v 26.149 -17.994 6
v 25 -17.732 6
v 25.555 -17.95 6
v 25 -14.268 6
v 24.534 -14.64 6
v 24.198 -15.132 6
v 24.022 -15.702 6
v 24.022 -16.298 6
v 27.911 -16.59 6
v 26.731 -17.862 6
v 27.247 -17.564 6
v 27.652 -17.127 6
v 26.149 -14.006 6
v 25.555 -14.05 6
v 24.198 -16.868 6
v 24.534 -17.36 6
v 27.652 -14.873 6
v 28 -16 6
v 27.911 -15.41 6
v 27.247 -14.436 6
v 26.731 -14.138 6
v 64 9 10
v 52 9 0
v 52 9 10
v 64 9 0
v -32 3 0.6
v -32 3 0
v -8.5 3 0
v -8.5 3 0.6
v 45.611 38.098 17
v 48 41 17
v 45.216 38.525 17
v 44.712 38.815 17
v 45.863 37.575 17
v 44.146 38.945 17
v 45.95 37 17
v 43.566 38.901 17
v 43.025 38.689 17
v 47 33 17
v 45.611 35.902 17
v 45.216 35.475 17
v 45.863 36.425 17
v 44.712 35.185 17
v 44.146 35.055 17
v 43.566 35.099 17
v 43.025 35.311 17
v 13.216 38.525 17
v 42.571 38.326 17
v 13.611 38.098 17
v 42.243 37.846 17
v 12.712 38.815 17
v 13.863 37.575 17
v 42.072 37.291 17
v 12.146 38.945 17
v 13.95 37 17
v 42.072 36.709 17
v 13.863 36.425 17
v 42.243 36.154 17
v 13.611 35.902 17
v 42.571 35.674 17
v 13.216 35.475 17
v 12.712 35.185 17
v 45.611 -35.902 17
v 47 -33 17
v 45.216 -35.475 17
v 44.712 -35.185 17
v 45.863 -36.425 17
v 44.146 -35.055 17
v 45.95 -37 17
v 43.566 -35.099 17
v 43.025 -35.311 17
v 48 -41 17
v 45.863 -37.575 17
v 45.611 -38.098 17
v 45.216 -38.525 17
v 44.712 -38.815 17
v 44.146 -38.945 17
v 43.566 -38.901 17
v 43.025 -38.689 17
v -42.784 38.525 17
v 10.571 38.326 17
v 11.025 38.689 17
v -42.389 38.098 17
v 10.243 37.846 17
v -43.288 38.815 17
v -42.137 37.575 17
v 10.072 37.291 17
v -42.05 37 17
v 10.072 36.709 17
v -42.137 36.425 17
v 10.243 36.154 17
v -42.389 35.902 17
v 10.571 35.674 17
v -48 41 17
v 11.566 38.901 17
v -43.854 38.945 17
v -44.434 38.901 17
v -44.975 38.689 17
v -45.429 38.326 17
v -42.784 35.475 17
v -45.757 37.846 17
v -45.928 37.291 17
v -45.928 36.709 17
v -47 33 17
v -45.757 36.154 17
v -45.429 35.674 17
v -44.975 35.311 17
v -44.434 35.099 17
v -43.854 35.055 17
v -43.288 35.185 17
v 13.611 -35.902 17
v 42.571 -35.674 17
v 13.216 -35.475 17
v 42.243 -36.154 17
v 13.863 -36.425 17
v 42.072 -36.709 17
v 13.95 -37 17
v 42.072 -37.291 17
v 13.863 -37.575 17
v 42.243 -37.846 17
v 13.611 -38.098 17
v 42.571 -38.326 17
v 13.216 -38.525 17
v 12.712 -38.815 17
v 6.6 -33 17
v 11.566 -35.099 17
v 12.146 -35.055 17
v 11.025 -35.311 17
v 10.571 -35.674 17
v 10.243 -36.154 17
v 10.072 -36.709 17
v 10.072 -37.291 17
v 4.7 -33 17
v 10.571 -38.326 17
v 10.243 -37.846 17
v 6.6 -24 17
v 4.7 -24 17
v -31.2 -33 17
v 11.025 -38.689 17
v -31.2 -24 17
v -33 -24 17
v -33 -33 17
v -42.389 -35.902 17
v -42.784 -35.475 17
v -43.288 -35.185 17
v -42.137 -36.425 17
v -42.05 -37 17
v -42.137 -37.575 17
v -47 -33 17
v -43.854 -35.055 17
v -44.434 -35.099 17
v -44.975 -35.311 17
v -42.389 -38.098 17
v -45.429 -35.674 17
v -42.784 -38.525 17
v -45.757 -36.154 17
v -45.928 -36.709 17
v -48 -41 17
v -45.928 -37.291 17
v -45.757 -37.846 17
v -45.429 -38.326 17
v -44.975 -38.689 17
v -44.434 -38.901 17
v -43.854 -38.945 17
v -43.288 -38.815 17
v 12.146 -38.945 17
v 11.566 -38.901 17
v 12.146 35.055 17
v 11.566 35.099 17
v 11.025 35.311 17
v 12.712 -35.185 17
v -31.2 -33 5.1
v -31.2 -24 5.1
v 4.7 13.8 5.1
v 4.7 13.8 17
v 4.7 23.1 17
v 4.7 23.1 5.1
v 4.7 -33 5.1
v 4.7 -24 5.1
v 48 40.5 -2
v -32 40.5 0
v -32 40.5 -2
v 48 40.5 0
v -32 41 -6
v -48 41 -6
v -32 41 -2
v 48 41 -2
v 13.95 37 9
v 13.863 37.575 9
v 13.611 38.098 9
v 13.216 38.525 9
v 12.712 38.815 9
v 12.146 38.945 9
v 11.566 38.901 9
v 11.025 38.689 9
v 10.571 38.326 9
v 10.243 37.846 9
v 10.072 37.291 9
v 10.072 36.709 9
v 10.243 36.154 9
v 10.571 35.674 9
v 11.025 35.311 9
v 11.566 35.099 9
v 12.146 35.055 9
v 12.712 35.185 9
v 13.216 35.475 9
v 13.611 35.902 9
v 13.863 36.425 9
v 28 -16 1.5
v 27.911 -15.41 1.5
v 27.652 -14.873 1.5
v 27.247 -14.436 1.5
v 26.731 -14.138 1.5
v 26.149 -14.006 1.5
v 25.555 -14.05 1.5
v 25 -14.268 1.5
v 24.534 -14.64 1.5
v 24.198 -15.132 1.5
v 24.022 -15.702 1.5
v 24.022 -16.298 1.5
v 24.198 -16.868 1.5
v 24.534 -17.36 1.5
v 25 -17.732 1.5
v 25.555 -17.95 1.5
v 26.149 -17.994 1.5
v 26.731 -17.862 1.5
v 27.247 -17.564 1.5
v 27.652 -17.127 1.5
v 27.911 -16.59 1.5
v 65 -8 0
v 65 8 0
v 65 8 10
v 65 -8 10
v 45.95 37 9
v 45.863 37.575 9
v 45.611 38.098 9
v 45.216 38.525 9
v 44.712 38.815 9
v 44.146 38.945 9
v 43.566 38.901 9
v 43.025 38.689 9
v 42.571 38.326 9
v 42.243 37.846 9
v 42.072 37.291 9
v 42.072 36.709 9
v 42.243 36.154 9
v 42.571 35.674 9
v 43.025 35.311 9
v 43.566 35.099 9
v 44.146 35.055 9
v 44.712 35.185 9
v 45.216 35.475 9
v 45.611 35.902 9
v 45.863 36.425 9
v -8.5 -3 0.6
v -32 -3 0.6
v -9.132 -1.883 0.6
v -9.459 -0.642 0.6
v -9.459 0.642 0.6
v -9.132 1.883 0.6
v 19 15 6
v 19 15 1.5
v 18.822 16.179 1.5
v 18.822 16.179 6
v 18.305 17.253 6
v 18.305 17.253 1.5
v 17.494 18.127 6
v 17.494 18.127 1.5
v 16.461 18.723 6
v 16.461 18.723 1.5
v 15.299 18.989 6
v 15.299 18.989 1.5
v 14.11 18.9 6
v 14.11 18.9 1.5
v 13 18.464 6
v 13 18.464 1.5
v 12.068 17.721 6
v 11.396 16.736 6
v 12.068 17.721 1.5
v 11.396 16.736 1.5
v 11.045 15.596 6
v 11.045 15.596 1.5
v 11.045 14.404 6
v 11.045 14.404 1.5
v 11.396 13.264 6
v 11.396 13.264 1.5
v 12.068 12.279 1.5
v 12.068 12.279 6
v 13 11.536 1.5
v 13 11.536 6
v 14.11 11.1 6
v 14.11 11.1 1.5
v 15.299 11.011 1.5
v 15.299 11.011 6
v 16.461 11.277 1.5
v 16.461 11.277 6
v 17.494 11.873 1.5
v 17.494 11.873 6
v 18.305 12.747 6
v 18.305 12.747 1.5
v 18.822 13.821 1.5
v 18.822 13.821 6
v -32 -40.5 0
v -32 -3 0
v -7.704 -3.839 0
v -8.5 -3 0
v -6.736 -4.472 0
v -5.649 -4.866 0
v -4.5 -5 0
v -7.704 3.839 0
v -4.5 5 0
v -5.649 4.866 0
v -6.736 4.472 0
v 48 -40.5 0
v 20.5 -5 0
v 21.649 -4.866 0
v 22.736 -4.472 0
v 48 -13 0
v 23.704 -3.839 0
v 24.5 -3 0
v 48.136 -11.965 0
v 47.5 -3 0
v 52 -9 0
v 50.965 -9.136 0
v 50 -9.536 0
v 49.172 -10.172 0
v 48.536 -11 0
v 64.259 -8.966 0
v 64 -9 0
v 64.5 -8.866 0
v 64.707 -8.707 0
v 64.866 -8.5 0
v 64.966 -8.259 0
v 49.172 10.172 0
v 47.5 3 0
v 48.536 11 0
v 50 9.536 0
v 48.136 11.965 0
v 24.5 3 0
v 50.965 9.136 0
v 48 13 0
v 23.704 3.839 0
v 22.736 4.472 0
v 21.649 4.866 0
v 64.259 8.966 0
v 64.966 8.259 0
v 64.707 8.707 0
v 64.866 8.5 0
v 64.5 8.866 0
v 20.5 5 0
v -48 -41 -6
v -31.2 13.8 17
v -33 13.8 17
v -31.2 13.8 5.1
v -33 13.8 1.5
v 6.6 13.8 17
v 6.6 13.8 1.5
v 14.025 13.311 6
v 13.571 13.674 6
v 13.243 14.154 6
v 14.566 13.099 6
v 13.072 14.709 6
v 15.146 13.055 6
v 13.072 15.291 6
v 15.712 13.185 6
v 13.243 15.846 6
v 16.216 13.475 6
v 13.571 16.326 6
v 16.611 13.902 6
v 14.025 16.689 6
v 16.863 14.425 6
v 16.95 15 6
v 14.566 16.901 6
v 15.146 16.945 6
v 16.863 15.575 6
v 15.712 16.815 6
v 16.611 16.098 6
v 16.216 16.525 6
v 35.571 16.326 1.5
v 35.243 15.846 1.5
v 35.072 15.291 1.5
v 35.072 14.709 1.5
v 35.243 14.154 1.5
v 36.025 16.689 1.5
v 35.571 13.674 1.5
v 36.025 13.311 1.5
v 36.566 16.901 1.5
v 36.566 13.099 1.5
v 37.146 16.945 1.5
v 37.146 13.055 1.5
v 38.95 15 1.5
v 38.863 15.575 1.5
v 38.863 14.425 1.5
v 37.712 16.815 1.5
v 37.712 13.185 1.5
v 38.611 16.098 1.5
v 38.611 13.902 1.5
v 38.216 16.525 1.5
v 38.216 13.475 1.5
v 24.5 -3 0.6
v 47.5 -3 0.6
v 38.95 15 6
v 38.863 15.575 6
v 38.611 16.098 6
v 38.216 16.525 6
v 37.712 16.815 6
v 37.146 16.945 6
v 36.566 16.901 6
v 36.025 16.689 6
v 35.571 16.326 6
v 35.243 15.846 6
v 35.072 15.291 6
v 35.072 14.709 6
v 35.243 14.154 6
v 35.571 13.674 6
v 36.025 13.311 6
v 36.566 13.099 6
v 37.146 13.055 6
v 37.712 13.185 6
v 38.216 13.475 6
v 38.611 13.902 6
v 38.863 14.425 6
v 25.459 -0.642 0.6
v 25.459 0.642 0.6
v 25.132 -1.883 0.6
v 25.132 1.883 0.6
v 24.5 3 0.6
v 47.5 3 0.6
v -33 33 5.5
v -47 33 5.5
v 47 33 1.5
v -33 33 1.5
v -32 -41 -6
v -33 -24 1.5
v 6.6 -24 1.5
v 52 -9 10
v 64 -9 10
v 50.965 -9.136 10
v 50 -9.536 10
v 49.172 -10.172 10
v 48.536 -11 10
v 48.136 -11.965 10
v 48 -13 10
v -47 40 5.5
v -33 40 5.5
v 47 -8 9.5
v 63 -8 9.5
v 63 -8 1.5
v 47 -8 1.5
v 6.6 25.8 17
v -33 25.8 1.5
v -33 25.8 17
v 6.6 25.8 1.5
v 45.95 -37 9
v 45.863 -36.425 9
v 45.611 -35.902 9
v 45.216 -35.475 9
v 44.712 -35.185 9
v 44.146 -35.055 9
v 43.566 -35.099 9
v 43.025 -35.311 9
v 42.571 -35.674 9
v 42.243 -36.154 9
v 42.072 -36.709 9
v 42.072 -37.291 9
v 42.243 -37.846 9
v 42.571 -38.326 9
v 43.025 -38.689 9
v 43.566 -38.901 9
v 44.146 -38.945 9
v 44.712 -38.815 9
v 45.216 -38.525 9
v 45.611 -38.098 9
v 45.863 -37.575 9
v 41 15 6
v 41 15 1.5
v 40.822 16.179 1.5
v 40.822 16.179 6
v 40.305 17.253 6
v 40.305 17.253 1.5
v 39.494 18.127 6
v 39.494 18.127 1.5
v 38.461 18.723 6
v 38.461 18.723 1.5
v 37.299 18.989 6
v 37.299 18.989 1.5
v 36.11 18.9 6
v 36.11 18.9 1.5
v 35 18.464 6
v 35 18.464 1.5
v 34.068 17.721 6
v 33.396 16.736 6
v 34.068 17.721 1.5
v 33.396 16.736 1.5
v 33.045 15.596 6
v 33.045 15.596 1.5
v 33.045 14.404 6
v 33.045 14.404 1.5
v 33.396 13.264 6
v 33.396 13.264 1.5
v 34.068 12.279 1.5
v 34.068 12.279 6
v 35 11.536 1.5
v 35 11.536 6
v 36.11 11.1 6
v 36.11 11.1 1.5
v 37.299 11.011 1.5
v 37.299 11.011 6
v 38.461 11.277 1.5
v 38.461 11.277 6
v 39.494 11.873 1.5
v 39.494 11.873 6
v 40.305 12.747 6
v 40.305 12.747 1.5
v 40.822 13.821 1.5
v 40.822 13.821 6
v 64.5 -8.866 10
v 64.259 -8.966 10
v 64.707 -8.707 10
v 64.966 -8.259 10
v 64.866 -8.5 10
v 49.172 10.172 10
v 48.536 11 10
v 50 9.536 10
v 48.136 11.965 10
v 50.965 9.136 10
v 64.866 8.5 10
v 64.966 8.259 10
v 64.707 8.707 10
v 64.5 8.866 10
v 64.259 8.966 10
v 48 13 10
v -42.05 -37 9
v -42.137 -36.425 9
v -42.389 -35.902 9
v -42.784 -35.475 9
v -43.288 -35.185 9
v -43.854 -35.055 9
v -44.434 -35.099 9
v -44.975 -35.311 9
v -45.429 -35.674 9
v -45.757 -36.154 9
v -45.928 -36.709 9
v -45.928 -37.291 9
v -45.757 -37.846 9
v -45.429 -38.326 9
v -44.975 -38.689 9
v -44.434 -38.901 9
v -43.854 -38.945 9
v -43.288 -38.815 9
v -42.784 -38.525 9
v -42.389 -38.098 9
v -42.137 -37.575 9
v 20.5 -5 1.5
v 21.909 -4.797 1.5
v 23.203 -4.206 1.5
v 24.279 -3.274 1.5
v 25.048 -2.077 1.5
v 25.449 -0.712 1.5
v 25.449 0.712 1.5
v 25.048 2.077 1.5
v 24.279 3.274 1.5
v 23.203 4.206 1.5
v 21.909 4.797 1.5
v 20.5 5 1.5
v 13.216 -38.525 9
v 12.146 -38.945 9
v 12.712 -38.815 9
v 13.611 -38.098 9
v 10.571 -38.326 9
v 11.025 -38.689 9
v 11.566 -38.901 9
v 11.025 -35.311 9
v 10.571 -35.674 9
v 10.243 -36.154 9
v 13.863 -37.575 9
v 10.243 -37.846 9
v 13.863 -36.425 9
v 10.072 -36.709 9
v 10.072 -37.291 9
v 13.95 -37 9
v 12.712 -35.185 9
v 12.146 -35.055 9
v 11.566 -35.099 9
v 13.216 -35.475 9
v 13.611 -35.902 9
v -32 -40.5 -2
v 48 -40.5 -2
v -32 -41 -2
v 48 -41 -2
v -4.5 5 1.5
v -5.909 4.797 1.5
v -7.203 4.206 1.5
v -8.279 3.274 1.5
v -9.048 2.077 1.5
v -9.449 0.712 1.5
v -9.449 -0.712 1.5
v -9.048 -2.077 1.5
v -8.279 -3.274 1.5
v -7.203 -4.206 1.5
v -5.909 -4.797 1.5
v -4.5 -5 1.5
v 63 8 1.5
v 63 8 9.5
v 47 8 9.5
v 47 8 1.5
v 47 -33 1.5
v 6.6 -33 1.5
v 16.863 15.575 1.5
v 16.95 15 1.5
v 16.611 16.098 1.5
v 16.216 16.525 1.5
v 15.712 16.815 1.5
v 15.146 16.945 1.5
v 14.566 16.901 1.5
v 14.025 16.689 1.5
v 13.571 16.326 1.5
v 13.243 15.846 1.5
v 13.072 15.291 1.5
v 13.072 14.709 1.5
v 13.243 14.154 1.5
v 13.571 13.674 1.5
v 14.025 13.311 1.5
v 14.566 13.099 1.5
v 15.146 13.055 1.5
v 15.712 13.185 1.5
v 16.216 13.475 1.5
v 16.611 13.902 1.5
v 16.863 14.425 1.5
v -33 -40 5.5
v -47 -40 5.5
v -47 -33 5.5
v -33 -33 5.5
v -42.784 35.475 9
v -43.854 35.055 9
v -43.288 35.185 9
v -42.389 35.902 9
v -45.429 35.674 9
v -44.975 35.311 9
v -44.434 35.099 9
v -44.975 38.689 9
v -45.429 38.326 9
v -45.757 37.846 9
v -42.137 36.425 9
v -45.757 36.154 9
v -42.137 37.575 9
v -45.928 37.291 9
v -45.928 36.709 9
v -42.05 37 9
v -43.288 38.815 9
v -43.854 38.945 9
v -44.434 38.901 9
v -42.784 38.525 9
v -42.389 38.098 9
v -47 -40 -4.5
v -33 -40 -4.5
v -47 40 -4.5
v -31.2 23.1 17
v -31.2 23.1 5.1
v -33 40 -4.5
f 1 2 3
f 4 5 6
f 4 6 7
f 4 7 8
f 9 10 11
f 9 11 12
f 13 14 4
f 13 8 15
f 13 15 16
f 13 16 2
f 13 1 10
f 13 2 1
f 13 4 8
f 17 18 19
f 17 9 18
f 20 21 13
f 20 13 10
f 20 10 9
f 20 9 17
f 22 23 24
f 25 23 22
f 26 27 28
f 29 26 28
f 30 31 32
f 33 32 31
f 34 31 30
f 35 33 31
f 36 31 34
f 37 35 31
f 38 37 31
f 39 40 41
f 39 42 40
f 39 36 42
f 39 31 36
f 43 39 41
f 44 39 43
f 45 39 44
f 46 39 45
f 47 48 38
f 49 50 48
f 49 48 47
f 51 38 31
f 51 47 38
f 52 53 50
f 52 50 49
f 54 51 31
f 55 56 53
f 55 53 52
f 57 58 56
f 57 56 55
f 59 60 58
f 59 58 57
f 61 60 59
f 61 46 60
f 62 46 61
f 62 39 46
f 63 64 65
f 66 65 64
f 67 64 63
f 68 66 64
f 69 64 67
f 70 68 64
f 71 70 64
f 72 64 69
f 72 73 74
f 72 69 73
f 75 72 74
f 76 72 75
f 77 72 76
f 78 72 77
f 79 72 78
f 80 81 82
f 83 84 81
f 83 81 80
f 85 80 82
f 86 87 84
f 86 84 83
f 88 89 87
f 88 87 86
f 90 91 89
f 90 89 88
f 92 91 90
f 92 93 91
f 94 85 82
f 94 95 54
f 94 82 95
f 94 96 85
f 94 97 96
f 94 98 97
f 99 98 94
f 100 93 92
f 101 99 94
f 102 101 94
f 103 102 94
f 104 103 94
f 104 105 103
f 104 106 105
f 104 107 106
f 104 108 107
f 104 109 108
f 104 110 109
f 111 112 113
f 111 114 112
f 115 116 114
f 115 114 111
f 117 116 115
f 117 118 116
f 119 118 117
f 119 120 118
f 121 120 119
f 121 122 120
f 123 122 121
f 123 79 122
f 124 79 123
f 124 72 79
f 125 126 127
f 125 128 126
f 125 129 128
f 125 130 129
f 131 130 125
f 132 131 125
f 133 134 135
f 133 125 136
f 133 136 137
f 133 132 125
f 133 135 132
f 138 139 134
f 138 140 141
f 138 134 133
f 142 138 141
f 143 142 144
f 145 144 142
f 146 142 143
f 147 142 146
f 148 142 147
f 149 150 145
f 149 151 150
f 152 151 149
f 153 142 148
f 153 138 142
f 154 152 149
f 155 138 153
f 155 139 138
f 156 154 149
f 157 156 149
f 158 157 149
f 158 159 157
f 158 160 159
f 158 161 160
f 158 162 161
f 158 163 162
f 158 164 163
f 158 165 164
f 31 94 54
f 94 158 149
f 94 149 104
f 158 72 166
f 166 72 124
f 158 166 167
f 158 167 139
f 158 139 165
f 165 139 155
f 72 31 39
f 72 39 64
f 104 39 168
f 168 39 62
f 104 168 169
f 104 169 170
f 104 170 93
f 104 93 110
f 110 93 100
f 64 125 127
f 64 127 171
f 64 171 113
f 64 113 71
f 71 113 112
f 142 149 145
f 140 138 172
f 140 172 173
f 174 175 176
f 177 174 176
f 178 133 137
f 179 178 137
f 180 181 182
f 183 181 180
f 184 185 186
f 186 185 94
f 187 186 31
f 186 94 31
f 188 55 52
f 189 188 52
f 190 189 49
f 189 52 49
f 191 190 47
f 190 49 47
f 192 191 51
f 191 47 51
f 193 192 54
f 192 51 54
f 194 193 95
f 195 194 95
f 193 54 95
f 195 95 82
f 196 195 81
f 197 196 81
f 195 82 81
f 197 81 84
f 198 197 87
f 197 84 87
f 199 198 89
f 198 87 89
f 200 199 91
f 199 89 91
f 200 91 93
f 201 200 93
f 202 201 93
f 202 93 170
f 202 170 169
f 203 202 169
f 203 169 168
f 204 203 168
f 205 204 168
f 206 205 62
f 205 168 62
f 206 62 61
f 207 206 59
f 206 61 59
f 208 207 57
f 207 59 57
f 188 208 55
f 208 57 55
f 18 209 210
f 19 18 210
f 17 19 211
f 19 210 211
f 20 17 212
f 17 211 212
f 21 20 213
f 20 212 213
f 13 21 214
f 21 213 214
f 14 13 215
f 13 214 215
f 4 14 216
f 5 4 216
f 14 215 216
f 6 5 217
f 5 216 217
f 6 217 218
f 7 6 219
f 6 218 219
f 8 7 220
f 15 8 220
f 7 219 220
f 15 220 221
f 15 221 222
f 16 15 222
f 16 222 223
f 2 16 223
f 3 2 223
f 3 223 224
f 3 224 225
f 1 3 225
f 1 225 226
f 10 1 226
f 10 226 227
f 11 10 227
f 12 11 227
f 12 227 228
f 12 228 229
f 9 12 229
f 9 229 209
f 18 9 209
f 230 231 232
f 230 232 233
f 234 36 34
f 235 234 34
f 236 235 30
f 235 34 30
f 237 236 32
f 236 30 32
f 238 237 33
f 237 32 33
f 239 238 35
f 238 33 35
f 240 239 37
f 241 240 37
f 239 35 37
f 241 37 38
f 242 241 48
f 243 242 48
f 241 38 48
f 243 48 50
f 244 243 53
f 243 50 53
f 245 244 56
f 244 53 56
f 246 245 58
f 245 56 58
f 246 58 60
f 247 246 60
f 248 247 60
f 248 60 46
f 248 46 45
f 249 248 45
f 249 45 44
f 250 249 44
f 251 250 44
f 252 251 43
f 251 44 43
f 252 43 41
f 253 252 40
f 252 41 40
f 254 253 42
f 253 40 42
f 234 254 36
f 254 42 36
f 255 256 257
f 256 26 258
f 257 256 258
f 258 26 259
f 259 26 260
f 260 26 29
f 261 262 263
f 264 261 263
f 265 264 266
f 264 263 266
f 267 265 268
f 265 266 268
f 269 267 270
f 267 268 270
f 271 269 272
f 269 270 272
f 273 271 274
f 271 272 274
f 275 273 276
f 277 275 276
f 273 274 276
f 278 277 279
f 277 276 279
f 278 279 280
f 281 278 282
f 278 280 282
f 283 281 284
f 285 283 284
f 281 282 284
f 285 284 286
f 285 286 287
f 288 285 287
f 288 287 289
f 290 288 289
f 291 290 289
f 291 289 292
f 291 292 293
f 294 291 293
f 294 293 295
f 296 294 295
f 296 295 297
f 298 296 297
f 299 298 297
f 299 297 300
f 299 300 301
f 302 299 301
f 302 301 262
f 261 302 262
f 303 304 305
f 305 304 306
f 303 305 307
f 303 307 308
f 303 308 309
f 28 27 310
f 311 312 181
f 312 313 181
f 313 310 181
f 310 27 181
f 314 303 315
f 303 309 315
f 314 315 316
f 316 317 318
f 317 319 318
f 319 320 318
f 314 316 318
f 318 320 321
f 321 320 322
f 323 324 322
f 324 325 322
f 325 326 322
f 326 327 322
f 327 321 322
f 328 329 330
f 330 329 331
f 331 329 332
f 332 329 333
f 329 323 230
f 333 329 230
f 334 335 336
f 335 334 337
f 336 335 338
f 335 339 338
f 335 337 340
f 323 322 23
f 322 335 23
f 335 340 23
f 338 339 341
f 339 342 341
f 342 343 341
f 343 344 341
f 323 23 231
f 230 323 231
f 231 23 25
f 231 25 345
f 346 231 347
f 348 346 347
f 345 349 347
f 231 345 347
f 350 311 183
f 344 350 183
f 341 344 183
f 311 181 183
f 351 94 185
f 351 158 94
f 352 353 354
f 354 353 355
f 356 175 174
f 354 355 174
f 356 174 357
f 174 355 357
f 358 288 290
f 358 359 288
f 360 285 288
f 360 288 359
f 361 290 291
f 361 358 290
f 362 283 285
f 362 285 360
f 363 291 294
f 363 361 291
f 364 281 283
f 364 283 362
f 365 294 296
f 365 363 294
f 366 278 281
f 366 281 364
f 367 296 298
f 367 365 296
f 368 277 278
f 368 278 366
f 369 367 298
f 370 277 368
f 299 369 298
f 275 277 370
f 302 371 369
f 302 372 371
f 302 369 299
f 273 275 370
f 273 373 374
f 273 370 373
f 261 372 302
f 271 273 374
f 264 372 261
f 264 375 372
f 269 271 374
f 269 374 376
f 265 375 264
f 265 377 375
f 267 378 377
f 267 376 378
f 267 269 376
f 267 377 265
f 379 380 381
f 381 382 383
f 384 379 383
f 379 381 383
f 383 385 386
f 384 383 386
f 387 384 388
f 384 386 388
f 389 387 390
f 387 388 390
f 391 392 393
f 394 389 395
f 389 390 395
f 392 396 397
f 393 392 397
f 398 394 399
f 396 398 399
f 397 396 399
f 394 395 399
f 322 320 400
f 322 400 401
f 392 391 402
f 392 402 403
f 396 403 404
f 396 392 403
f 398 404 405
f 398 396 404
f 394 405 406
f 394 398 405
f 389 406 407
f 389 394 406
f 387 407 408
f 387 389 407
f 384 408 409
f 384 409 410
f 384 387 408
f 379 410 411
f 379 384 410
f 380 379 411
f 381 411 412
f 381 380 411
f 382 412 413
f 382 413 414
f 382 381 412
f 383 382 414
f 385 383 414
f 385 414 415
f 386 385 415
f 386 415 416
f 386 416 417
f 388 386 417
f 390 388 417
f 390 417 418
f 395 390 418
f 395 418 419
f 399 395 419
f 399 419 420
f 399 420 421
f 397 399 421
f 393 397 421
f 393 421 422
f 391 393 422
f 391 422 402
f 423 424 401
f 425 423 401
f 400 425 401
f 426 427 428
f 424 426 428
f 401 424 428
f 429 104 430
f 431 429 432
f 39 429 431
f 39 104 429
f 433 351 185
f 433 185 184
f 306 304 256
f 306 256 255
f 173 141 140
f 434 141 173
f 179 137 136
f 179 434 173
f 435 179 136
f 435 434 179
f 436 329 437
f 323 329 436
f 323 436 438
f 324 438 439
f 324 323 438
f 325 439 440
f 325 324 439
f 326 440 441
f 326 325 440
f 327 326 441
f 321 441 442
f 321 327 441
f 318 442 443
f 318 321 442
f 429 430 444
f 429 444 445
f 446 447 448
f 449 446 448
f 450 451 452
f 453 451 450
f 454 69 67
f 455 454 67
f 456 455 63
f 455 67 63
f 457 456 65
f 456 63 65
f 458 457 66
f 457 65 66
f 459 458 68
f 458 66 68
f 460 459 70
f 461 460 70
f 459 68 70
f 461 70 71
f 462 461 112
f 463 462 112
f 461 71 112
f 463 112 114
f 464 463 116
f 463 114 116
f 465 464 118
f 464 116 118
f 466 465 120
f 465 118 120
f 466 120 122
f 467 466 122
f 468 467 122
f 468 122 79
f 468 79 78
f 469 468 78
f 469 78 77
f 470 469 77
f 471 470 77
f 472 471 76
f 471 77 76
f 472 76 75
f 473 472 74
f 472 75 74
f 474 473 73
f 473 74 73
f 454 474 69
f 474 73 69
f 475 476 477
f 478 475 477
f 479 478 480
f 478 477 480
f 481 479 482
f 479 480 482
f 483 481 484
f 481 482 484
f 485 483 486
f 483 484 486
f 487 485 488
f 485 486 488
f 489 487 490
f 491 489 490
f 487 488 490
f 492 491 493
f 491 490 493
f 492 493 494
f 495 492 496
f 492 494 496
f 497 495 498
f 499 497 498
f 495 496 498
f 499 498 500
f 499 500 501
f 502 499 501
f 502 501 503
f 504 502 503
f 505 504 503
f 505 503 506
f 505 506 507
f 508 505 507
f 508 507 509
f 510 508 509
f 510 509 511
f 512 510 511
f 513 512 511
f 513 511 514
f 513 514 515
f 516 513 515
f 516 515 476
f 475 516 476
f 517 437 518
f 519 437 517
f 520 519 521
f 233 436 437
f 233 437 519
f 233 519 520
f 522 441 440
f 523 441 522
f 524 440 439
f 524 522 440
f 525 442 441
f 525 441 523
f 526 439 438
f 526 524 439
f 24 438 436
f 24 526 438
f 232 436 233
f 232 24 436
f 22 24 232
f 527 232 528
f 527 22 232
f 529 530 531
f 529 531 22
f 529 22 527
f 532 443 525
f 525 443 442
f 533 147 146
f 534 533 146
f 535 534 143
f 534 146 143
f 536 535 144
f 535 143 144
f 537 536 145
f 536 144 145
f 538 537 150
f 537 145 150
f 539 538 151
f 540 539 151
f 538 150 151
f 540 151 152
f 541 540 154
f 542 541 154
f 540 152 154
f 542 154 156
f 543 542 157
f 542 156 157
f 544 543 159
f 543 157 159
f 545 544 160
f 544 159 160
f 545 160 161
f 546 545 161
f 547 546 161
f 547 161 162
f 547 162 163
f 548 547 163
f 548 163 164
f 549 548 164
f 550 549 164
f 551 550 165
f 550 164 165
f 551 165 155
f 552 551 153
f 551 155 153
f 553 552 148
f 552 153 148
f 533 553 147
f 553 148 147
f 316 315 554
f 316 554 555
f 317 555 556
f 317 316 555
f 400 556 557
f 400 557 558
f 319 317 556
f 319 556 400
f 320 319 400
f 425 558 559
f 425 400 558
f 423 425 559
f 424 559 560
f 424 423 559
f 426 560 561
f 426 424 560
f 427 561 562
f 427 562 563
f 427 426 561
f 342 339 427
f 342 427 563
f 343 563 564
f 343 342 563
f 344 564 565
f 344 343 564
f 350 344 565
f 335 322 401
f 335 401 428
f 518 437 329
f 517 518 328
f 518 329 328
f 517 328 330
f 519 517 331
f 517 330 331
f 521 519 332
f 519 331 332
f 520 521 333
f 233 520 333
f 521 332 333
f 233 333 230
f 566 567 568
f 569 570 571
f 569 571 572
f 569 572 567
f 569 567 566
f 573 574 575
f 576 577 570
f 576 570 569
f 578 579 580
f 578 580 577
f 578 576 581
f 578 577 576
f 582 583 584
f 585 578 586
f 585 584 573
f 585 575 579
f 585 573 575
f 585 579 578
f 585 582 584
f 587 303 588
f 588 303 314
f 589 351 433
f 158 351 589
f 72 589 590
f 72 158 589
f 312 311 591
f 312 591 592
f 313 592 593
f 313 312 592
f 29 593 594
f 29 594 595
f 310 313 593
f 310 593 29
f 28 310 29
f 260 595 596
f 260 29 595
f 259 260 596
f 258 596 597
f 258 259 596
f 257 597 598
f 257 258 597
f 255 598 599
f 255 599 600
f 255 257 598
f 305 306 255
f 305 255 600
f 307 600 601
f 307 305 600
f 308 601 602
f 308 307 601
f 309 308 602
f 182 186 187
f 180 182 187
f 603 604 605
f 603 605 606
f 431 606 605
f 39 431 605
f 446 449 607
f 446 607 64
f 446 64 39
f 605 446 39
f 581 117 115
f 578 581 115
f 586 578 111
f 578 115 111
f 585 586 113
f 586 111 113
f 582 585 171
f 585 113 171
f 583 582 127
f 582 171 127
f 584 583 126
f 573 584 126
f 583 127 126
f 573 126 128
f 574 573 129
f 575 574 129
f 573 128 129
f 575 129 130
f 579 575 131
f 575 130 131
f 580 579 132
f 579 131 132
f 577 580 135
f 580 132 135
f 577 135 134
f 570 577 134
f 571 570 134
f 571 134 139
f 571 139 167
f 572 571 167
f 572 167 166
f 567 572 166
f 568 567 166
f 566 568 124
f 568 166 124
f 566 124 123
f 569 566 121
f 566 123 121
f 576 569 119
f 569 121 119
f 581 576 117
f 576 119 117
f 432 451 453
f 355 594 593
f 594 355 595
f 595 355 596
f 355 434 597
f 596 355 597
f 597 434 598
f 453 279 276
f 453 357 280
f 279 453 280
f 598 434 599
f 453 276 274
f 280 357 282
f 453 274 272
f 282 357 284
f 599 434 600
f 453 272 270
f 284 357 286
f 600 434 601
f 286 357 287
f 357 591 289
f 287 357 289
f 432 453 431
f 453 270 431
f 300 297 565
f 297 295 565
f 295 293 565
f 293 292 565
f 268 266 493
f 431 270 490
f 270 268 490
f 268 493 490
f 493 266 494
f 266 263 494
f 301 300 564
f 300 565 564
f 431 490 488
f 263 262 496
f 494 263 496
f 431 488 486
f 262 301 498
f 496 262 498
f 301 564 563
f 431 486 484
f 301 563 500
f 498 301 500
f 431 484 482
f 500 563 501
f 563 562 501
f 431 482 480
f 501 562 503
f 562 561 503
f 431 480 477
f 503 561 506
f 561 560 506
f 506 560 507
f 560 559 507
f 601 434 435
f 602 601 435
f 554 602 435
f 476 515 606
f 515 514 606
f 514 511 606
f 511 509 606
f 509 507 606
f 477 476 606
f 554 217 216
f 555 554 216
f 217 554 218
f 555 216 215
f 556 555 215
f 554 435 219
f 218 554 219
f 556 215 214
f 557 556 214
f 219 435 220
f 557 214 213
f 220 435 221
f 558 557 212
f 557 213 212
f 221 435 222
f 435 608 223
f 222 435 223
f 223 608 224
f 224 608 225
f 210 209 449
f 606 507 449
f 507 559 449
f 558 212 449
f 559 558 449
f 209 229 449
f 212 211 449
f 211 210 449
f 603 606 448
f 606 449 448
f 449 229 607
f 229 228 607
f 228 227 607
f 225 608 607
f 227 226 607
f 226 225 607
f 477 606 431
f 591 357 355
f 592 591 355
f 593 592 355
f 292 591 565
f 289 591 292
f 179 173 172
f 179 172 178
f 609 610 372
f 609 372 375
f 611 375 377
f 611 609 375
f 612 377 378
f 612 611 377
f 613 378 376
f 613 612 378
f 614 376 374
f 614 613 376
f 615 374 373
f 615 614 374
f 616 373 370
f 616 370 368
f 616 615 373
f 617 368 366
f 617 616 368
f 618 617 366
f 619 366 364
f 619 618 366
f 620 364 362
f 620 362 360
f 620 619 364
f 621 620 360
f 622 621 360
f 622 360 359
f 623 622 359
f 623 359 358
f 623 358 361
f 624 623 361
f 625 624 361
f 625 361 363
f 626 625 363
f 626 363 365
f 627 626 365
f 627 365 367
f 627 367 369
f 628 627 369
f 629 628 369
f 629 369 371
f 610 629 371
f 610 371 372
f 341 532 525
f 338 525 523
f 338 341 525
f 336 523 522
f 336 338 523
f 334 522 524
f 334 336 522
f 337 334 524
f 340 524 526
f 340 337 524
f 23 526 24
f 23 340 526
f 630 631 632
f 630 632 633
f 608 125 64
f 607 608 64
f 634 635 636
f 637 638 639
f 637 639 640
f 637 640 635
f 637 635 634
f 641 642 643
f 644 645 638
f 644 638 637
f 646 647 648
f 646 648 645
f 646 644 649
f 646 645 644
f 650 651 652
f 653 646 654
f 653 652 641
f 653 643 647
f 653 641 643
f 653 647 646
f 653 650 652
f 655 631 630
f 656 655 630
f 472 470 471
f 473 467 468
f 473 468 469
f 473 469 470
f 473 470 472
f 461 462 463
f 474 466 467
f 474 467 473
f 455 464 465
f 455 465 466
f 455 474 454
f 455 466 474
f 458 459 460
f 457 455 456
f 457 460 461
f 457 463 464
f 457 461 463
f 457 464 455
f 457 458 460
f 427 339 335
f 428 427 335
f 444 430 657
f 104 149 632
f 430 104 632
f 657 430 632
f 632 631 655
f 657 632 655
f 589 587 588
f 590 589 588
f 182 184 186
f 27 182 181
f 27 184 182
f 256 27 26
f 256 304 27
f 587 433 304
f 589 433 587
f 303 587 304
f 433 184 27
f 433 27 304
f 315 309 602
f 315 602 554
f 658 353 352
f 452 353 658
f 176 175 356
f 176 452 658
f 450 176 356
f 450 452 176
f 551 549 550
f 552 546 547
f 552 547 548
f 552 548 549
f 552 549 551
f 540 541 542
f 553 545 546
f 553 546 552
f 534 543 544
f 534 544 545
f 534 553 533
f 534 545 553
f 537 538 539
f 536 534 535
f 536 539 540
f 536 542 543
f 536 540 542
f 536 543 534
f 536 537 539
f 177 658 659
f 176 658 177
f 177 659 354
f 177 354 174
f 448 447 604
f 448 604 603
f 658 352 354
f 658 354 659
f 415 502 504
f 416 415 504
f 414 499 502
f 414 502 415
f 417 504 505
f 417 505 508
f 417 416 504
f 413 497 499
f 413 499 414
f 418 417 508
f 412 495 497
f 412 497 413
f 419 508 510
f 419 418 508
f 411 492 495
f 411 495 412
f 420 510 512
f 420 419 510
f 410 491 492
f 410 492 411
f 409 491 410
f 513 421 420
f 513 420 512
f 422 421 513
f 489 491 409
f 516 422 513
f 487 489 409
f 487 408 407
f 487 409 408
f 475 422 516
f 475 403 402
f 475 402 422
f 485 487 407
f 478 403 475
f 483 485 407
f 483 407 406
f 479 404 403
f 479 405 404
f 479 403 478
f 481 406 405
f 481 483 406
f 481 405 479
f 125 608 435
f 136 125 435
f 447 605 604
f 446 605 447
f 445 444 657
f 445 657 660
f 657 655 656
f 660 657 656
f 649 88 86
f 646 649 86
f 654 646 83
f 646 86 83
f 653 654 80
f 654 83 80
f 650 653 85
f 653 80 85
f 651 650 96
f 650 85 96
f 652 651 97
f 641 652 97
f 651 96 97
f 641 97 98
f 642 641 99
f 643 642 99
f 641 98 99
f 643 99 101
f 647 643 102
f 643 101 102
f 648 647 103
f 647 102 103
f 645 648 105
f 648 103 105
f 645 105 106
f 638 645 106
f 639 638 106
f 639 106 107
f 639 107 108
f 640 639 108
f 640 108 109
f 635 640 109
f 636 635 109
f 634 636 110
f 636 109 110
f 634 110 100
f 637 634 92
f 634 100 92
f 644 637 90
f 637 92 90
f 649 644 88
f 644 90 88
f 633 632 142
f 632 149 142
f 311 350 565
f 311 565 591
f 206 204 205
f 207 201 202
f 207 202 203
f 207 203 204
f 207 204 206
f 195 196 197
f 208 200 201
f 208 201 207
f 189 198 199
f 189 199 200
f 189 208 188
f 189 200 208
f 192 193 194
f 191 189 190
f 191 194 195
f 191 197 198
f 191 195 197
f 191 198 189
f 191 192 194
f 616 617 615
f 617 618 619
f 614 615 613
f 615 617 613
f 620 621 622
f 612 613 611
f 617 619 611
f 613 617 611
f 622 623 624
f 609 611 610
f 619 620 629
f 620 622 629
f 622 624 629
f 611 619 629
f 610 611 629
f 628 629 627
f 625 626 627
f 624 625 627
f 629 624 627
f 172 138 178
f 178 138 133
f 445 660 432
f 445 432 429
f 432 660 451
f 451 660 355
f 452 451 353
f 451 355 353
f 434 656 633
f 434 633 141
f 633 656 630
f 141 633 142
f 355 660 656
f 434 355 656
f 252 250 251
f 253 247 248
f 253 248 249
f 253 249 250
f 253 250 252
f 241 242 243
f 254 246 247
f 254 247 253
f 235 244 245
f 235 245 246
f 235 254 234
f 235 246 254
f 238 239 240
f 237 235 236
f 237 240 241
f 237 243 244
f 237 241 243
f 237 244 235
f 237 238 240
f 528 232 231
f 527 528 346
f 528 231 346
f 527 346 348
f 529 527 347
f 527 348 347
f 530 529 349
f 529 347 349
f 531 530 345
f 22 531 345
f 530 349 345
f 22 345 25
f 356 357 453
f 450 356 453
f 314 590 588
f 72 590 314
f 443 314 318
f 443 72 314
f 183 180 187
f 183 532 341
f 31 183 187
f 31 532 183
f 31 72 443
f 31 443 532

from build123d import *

# Parameters (mm, degrees)
PAD_DEPTH       = 41
POCKET_DEPTH    = 33
POCKET001_DEPTH = 1.5
SKETCH007_R     = 4
SKETCH007_R_2   = 1.95
SKETCH007_R_3   = 2
PAD005_DEPTH    = 6
SKETCH008_W     = 14
SKETCH008_H     = 10
POCKET002_DEPTH = 40
SKETCH013_R     = 1.95
POCKET003_DEPTH = 8
SKETCH018_W     = 39.6
SKETCH018_H     = 12
SKETCH018_H_2   = 9
PAD012_DEPTH    = 17
SKETCH019_W     = 35.9
SKETCH019_H     = 56.1
POCKET006_DEPTH = 11.9
SKETCH023_W     = 79.5
SKETCH023_H     = 6
POCKET007_DEPTH = 0.6
SKETCH024_W     = 80
SKETCH024_H     = 0.5
PAD016_DEPTH    = 2
PAD017_DEPTH    = 10
SKETCH026_W     = 8
SKETCH026_H     = 16
POCKET008_DEPTH = 16


with BuildPart() as part:
    # Sketch → Pad (new body, symmetric)
    with BuildSketch(Plane.XZ):
        Polygon((-48, 17), (-48, -6), (-32, -6), (-32, 0), (48, 0), (48, 17), align=None)
    extrude(amount=PAD_DEPTH, both=True)

    # Sketch001 → Pocket (cut, symmetric)
    with BuildSketch(Plane.XZ):
        Polygon((-33, 1.5), (47, 1.5), (47, 18.5), (-47, 18.5), (-47, -4.5), (-33, -4.5), align=None)
    extrude(amount=POCKET_DEPTH, both=True, mode=Mode.SUBTRACT)

    # Sketch004 → Pocket001 (cut)
    with BuildSketch(Plane.XY):
        with BuildLine():
            ThreePointArc((-4.5, 5), (-9.5, 0), (-4.5, -5))
            Line((-4.5, -5), (20.5, -5))
            ThreePointArc((20.5, -5), (25.5, 0), (20.5, 5))
            Line((20.5, 5), (-4.5, 5))
        make_face()
    extrude(amount=POCKET001_DEPTH, mode=Mode.SUBTRACT)

    # Sketch007 → Pad005 (join)
    with BuildSketch(Plane.XY):
        with Locations((15, 15)):
            Circle(SKETCH007_R)
        with Locations((15, 15)):
            Circle(SKETCH007_R_2, mode=Mode.SUBTRACT)
        with Locations((37, 15)):
            Circle(SKETCH007_R)
        with Locations((37, 15)):
            Circle(SKETCH007_R_2, mode=Mode.SUBTRACT)
        with Locations((26, -16)):
            Circle(SKETCH007_R_3)
    extrude(amount=PAD005_DEPTH)

    # Sketch008 → Pocket002 (cut, symmetric)
    with BuildSketch(Plane.XZ):
        with Locations((-40, 0.5)):
            Rectangle(SKETCH008_W, SKETCH008_H)
    extrude(amount=POCKET002_DEPTH, both=True, mode=Mode.SUBTRACT)

    # Sketch013 (on DatumPlane) → Pocket003 (cut)
    with BuildSketch(Plane.XY.offset(17)):
        with Locations((-44, 37)):
            Circle(SKETCH013_R)
        with Locations((12, 37)):
            Circle(SKETCH013_R)
        with Locations((44, 37)):
            Circle(SKETCH013_R)
        with Locations((44, -37)):
            Circle(SKETCH013_R)
        with Locations((12, -37)):
            Circle(SKETCH013_R)
        with Locations((-44, -37)):
            Circle(SKETCH013_R)
    extrude(amount=-POCKET003_DEPTH, mode=Mode.SUBTRACT)

    # Sketch018 → Pad012 (join)
    with BuildSketch(Plane.XY):
        with Locations((-13.2, 19.8)):
            Rectangle(SKETCH018_W, SKETCH018_H)
        with Locations((-13.2, -28.5)):
            Rectangle(SKETCH018_W, SKETCH018_H_2)
    extrude(amount=PAD012_DEPTH)

    # Sketch019 (on DatumPlane) → Pocket006 (cut)
    with BuildSketch(Plane.XY.offset(17)):
        with Locations((-13.25, -4.95)):
            Rectangle(SKETCH019_W, SKETCH019_H)
    extrude(amount=-POCKET006_DEPTH, mode=Mode.SUBTRACT)

    # Sketch023 → Pocket007 (cut)
    with BuildSketch(Plane.XY):
        with Locations((7.75, 0)):
            Rectangle(SKETCH023_W, SKETCH023_H)
    extrude(amount=POCKET007_DEPTH, mode=Mode.SUBTRACT)

    # Sketch024 → Pad016 (join)
    with BuildSketch(Plane.XY):
        with Locations((8, 40.75)):
            Rectangle(SKETCH024_W, SKETCH024_H)
        with Locations((8, -40.75)):
            Rectangle(SKETCH024_W, SKETCH024_H)
    extrude(amount=-PAD016_DEPTH)

    # Sketch025 → Pad017 (join)
    with BuildSketch(Plane.XY):
        with BuildLine():
            Line((48, 13), (48, -13))
            ThreePointArc((52, -9), (49.171573, -10.171573), (48, -13))
            Line((64, -9), (52, -9))
            ThreePointArc((64, -9), (64.707107, -8.707107), (65, -8))
            Line((65, 8), (65, -8))
            ThreePointArc((65, 8), (64.707107, 8.707107), (64, 9))
            Line((52, 9), (64, 9))
            ThreePointArc((48, 13), (49.171573, 10.171573), (52, 9))
        make_face()
    extrude(amount=PAD017_DEPTH)

    # Sketch026 (on Face12 of Pad017) → Pocket008 (cut)
    with BuildSketch(Plane(origin=(47, 0, 0), x_dir=(0, 0, -1), z_dir=(-1, 0, 0))):
        with Locations((-5.5, 0)):
            Rectangle(SKETCH026_W, SKETCH026_H)
    extrude(amount=-POCKET008_DEPTH, mode=Mode.SUBTRACT)


solid = part.part
